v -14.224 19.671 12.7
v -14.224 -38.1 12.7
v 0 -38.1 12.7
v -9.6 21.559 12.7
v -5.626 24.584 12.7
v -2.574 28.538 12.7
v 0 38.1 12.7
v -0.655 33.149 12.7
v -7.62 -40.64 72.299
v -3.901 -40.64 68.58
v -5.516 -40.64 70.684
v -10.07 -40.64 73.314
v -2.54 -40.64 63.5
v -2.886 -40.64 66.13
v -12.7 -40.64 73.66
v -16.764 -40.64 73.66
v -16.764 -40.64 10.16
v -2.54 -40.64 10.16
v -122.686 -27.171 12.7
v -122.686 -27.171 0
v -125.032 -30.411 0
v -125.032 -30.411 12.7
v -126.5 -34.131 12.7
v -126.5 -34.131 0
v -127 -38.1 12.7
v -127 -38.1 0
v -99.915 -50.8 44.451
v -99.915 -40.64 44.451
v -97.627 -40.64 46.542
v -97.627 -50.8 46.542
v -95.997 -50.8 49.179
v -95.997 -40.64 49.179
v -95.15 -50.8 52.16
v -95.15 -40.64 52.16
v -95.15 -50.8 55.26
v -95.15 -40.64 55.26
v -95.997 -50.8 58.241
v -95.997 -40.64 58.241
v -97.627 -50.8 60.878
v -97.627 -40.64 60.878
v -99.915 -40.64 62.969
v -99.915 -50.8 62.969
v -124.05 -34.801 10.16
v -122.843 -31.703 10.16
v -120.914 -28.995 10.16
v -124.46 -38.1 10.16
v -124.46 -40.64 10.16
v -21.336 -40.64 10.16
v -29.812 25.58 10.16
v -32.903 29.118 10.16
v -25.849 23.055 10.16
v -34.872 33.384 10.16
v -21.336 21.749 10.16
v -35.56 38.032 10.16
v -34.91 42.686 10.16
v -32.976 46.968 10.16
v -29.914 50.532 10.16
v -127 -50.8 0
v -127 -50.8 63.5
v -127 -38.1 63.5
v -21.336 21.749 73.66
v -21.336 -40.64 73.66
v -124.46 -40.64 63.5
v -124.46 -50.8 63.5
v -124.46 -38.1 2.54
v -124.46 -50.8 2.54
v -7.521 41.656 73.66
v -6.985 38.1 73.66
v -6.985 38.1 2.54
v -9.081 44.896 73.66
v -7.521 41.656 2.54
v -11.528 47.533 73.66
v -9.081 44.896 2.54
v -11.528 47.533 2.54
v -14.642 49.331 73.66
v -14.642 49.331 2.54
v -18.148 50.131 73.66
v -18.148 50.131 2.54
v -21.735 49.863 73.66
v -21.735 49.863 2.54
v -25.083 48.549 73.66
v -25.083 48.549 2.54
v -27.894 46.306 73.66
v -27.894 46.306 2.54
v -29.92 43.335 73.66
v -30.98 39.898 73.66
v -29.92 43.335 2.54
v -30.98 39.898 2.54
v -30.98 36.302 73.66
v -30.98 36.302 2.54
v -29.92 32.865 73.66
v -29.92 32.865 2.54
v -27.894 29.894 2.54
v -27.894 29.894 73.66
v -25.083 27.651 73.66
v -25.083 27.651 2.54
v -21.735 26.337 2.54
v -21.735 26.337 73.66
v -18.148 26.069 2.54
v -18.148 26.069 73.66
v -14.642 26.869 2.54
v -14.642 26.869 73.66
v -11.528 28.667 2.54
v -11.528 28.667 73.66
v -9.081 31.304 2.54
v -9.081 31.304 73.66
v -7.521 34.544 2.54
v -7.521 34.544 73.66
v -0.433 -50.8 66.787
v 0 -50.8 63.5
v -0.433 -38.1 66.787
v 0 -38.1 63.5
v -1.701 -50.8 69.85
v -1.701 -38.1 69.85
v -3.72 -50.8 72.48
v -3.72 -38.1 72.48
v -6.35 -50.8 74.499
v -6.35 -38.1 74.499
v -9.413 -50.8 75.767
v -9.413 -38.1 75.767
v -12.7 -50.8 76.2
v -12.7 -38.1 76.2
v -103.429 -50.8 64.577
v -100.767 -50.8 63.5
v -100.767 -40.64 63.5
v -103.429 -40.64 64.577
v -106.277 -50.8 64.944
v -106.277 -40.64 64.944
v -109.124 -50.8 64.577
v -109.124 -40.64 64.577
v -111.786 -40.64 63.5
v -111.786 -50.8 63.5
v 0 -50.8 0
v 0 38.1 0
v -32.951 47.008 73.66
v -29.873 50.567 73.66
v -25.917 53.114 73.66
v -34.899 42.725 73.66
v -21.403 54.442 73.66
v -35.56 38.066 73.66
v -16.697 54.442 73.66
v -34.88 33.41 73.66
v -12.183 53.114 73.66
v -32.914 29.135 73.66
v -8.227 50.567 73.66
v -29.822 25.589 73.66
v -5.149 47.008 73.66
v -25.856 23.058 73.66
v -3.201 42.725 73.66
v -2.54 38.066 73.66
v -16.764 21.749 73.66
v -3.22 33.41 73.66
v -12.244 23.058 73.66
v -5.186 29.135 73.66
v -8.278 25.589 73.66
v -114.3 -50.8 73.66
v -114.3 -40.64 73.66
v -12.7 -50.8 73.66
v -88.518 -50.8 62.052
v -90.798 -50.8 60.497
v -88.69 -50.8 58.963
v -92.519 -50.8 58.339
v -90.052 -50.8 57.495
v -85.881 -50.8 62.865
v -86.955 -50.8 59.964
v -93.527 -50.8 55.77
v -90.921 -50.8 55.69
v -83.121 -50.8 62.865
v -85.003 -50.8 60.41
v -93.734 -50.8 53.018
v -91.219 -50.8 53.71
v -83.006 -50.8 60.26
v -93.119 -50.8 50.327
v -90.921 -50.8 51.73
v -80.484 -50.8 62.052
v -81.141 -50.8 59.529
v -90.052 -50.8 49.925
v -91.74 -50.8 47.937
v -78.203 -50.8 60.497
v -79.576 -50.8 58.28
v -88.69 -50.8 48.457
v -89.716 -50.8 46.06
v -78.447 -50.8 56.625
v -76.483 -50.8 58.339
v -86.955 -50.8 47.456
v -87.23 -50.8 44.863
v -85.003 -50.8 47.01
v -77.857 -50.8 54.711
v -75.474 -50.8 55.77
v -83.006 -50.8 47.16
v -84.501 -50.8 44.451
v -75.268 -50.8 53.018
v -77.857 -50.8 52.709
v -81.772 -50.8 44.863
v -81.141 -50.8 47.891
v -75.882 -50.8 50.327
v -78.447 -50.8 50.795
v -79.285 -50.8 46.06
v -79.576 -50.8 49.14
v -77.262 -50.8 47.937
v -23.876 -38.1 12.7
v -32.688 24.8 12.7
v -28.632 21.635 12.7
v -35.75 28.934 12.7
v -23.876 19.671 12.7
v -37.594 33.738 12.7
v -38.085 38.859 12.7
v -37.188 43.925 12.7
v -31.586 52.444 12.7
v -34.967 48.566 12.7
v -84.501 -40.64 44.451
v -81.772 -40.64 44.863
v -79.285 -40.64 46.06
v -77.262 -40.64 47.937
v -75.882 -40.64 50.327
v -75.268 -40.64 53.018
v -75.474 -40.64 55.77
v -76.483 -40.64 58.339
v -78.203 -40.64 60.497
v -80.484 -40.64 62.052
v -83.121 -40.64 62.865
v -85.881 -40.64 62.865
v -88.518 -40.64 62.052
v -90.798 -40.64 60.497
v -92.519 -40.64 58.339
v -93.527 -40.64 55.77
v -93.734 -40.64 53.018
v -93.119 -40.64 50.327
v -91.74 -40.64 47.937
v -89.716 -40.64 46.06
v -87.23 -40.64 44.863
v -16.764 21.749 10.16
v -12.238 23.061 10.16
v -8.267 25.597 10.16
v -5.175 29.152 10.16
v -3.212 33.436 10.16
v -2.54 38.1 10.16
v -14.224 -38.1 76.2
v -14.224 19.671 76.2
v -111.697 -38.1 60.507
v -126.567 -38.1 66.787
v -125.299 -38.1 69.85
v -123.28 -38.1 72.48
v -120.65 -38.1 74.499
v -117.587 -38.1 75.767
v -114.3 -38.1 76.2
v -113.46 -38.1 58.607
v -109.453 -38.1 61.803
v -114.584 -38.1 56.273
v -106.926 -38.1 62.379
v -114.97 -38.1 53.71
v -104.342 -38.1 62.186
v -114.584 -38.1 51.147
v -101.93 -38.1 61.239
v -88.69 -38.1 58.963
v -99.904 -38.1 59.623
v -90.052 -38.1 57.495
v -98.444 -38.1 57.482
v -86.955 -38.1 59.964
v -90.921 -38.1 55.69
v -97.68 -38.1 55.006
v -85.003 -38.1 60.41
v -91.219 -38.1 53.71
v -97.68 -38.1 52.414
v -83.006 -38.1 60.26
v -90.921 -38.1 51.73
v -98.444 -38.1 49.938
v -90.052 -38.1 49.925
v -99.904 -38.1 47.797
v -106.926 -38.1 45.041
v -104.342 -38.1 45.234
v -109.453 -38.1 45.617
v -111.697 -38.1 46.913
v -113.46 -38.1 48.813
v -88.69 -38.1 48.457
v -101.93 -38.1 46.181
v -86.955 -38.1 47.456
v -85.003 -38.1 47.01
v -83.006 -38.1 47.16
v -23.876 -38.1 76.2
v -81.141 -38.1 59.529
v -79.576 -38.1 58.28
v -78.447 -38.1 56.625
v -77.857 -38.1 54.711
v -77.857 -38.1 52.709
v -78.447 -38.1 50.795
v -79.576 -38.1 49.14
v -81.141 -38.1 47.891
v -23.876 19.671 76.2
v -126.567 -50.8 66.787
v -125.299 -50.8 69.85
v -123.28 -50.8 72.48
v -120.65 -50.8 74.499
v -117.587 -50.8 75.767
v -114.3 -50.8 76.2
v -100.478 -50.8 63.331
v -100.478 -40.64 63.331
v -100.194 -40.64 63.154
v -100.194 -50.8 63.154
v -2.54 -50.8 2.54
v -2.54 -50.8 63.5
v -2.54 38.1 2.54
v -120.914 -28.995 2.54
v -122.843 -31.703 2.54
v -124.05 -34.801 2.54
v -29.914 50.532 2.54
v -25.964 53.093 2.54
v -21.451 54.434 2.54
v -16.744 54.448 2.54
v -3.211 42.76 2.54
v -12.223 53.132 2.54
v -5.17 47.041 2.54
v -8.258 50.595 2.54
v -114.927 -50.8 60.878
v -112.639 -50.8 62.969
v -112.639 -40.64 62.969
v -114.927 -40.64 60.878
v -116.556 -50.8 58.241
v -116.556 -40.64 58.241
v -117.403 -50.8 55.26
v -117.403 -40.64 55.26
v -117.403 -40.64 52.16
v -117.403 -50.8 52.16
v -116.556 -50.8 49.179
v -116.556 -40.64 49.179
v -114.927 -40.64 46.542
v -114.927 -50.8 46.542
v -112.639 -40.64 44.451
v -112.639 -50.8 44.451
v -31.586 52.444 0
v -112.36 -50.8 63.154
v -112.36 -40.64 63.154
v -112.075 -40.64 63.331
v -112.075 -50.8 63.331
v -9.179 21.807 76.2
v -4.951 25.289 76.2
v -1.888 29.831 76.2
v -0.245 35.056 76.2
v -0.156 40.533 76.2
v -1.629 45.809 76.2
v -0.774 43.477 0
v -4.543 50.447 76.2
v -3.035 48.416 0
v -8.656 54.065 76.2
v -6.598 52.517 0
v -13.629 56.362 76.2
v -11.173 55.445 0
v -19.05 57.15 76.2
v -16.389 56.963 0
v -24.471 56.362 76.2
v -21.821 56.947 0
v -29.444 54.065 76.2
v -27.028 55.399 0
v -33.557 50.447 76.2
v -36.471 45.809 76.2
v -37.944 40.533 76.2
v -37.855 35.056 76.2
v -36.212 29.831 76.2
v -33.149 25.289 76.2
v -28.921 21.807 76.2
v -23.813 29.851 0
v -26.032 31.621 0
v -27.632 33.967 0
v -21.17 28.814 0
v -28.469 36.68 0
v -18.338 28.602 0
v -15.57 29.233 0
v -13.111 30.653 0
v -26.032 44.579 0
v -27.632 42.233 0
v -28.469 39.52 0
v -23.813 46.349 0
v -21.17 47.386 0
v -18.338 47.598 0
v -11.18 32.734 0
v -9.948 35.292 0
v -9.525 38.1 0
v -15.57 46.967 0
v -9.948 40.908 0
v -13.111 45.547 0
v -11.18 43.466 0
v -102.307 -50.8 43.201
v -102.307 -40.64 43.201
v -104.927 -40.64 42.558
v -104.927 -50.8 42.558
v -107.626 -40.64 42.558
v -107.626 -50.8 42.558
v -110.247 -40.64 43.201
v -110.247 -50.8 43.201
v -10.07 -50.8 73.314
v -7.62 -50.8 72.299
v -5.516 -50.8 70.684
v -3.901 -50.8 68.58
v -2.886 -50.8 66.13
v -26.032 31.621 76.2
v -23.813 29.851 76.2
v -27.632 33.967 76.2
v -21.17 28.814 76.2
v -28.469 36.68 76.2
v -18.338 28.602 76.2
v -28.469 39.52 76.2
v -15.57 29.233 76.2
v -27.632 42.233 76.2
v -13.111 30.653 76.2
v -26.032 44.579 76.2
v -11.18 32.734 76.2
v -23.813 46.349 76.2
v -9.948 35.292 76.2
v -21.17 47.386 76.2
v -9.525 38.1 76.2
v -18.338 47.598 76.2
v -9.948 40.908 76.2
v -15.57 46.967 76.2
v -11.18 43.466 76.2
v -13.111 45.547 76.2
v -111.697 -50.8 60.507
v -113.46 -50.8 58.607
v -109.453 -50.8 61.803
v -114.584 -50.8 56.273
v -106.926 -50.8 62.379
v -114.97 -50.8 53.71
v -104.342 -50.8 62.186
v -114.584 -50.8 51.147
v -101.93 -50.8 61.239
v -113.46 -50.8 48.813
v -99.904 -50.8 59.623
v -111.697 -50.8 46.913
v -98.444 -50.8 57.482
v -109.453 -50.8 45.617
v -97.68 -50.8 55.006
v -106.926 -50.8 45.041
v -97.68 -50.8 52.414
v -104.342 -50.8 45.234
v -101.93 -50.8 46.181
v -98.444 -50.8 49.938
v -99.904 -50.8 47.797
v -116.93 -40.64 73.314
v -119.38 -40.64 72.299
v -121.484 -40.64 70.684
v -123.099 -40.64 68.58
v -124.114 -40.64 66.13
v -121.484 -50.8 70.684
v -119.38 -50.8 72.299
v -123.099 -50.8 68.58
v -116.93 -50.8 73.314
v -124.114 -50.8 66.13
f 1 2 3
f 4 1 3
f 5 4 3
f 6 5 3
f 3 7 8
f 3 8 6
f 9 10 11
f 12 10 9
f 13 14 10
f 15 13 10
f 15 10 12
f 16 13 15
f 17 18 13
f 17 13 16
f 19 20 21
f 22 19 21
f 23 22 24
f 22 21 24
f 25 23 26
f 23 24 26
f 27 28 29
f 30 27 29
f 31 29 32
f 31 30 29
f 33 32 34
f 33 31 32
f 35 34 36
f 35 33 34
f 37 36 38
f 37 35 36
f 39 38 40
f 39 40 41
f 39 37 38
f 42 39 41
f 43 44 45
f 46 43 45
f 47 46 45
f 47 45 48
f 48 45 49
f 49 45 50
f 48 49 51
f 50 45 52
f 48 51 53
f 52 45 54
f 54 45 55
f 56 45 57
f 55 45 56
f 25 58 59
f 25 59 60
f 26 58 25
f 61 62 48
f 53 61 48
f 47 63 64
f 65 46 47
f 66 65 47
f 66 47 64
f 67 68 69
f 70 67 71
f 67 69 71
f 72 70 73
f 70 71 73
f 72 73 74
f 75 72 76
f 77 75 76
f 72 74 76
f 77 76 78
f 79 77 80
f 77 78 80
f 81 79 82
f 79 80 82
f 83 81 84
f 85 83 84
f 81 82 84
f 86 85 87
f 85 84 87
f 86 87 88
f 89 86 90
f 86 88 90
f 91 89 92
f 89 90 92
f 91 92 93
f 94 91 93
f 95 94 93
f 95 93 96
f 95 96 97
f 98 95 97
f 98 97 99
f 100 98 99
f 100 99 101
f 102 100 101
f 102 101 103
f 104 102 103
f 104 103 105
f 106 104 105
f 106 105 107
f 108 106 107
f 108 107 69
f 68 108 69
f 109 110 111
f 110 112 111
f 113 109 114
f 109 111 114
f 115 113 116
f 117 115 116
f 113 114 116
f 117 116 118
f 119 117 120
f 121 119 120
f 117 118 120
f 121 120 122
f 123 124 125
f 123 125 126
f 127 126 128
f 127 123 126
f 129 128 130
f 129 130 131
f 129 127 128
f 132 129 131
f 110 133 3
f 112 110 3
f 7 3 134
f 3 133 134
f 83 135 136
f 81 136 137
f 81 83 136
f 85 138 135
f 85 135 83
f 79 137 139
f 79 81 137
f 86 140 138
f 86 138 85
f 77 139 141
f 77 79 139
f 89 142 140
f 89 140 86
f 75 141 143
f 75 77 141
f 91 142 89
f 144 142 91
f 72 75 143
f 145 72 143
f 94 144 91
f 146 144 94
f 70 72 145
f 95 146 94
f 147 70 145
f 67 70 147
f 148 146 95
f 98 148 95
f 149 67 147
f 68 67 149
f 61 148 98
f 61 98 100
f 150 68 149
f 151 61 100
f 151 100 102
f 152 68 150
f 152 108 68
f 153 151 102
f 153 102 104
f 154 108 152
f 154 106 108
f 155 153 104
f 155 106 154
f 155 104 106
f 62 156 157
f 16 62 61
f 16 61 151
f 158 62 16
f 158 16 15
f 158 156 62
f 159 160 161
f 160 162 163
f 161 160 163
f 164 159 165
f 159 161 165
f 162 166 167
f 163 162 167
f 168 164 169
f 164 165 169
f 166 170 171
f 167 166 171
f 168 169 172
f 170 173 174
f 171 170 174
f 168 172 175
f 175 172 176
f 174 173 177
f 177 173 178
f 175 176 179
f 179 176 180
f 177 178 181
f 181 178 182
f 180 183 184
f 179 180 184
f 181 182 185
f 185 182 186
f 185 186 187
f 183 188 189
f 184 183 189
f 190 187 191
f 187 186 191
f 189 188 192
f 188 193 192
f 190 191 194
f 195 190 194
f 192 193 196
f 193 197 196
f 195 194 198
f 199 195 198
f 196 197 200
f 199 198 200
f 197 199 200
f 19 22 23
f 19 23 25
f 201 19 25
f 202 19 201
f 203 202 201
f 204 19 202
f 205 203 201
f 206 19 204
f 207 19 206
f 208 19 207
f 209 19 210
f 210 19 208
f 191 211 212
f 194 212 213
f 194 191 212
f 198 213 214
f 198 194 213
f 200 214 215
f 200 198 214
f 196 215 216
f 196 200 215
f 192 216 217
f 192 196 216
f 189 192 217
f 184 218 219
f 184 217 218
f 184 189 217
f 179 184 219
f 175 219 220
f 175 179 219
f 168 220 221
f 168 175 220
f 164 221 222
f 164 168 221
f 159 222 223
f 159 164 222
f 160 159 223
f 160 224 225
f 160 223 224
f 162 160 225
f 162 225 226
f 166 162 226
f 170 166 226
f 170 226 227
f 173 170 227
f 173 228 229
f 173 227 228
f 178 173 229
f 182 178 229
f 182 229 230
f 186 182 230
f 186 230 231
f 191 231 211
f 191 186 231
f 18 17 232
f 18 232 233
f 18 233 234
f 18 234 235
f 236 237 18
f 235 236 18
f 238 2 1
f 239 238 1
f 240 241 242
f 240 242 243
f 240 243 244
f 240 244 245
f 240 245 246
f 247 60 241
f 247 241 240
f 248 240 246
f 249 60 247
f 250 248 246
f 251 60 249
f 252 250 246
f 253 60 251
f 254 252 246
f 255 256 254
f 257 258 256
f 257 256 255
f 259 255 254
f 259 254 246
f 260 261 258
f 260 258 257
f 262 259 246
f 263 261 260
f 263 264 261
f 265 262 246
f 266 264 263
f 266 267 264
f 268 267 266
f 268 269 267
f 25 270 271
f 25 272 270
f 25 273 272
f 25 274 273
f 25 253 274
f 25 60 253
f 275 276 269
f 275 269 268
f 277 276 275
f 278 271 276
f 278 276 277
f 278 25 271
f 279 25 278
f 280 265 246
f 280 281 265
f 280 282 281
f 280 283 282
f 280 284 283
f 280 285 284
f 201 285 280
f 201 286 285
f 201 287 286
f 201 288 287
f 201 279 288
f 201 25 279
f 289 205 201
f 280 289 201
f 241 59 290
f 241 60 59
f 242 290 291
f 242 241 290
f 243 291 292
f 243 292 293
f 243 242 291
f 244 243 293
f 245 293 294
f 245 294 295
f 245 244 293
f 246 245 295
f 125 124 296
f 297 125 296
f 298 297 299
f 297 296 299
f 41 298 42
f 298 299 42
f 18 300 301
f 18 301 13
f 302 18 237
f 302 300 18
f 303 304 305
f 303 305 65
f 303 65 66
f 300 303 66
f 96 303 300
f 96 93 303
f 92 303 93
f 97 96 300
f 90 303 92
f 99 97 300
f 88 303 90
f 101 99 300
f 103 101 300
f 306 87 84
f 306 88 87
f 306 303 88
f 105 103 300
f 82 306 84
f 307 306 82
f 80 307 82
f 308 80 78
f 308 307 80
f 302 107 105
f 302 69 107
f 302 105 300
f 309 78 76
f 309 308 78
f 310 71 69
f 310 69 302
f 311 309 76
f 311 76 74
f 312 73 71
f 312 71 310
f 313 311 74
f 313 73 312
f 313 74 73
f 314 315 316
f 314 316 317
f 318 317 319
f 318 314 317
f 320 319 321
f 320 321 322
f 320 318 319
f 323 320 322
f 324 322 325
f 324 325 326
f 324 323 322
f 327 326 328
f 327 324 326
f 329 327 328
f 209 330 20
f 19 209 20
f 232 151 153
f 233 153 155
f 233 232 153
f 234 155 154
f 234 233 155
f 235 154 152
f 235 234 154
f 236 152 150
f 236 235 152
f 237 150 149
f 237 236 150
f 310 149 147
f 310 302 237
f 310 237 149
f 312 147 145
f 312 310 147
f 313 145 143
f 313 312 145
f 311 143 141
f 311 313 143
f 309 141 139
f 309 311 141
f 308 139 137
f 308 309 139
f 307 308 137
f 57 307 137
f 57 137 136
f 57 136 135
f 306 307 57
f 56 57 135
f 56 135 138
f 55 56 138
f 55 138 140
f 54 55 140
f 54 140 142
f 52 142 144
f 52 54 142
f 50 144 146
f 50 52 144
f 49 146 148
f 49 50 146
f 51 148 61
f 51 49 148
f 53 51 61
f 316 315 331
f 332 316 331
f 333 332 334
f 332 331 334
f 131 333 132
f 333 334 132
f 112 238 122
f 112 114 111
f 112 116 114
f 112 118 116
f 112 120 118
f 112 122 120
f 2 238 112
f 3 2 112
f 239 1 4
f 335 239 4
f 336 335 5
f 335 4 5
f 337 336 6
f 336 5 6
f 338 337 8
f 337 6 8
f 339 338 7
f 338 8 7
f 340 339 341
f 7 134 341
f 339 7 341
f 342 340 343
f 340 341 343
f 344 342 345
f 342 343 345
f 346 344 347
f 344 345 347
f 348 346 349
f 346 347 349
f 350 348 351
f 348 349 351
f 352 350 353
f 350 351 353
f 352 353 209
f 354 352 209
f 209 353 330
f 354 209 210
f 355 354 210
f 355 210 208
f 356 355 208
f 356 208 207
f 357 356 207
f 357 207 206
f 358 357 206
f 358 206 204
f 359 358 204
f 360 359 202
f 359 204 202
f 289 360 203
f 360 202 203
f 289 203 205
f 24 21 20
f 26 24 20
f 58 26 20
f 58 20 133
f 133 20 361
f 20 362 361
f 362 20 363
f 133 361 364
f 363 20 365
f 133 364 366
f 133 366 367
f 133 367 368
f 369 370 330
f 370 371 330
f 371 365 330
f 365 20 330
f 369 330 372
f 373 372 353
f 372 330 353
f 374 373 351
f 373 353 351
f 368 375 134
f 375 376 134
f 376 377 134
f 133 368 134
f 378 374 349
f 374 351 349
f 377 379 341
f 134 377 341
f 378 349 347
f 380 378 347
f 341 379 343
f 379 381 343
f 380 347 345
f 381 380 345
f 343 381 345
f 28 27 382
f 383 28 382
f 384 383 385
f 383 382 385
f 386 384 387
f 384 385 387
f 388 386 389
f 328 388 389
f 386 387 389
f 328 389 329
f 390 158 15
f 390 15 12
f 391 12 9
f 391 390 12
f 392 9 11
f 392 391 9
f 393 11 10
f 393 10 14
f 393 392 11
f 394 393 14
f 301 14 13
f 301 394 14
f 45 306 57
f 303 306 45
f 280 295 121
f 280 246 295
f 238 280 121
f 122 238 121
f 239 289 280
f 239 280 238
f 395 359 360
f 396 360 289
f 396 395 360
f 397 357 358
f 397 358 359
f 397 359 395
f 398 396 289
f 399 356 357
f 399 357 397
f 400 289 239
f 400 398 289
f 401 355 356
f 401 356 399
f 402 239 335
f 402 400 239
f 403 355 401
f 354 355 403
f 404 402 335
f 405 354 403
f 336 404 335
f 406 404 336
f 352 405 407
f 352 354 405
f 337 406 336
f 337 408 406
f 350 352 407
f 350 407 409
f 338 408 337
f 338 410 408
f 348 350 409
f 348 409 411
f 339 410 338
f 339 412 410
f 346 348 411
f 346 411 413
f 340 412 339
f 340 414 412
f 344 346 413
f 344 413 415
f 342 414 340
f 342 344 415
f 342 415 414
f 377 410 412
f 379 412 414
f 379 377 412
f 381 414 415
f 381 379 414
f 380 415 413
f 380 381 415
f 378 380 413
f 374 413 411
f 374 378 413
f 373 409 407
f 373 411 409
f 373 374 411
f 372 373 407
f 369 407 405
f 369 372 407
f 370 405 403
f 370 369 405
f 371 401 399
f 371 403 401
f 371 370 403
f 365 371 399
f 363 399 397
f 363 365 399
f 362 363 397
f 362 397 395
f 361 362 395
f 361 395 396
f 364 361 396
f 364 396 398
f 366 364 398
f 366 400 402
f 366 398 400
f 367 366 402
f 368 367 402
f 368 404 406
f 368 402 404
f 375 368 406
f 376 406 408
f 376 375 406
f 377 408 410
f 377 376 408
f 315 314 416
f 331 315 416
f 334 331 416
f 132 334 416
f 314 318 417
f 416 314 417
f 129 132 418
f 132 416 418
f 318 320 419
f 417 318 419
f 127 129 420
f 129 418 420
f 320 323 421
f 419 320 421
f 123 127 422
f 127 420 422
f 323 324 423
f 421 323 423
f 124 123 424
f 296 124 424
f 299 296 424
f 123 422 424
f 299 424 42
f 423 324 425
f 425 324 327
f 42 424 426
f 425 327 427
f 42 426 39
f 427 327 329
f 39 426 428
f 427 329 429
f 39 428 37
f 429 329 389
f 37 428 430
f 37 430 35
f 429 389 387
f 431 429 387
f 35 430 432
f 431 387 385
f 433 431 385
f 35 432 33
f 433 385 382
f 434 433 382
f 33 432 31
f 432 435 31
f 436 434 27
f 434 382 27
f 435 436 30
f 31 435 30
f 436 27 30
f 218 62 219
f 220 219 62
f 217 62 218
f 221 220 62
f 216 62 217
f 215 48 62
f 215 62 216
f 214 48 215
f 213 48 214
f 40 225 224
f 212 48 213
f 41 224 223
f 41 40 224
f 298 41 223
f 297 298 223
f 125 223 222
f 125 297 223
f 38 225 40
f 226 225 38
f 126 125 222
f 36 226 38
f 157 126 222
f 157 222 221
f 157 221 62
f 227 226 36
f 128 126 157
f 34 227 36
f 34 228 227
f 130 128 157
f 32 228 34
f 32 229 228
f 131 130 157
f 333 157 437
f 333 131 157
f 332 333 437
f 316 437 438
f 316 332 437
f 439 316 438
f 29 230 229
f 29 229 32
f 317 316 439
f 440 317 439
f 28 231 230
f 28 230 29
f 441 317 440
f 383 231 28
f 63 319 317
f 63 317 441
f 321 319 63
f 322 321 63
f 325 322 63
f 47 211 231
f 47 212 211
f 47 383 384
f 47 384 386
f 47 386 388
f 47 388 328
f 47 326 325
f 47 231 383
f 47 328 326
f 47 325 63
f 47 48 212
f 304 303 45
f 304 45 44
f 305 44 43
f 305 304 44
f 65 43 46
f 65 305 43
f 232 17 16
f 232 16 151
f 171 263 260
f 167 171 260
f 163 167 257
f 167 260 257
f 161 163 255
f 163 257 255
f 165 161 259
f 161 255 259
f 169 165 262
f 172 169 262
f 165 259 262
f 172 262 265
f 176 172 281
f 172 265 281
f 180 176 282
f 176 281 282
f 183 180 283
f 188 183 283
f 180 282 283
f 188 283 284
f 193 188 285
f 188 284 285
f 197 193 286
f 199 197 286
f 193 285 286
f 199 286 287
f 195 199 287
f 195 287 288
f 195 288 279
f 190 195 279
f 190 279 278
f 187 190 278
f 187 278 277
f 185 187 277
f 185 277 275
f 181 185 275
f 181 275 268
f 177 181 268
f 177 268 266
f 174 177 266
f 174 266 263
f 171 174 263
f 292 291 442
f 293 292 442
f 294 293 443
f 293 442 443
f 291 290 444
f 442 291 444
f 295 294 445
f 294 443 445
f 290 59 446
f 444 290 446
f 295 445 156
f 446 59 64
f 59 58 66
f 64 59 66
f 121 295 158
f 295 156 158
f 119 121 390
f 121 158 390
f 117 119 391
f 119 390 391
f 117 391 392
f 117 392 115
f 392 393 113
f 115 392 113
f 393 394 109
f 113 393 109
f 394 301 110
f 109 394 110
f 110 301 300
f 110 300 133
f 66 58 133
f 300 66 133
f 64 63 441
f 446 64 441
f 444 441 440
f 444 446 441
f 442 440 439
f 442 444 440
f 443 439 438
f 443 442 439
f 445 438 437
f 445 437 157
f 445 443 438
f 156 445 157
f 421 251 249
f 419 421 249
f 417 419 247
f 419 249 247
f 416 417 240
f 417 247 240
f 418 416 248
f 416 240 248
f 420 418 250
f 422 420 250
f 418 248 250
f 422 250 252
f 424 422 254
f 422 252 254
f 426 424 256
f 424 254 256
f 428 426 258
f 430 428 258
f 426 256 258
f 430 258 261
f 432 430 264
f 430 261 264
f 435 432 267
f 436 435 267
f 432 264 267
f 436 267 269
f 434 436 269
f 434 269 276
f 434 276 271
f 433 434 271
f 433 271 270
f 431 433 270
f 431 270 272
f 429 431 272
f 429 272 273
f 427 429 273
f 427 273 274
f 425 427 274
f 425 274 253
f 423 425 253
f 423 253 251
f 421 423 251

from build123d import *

# Parameters (mm, degrees)
SKETCH1_W            = 127
SKETCH1_H            = 12.7
BOSS_EXTRUDE1_DEPTH  = 76.2
FILLET2_R            = 12.7
BOSS_EXTRUDE3_DEPTH  = 76.2
BOSS_EXTRUDE4_DEPTH  = 12.7
SKETCH3_R            = 8.693712638
SKETCH3_R_2          = 6.718686286
CUT_EXTRUDE2_DEPTH   = 177.090892723
SKETCH1_8_R          = 9.525
CUT_EXTRUDE3_DEPTH   = 159.75
SHELL4_START         = 2.54
SHELL4_OUTLINE_R     = 12.065
SHELL4_DEPTH         = 41.911304946
SHELL4_2_DEPTH       = 7.62
SHELL4_START_2       = 62.968677719
SHELL4_3_OUTLINE_R   = 12.065
SHELL4_3_DEPTH       = 0.531322281
SHELL4_START_3       = -50.8
SHELL4_4_DEPTH       = 10.16
SHELL4_START_4       = -40.64
SHELL4_5_OUTLINE_W   = 4.572
SHELL4_5_OUTLINE_H   = 18.517372773
SHELL4_5_OUTLINE_H_2 = 10.16
SHELL4_5_DEPTH       = 66.6749999
SHELL4_6_DEPTH       = 10.16
SHELL4_START_5       = 44.451304946
SHELL4_7_OUTLINE_R   = 12.065
SHELL4_7_DEPTH       = 29.208695054


with BuildPart() as part:
    # Sketch1 → Boss-Extrude1 (new body)
    with BuildSketch(Plane.XY):
        with Locations((-63.5, -44.45)):
            Rectangle(SKETCH1_W, SKETCH1_H)
    extrude(amount=BOSS_EXTRUDE1_DEPTH)

    # Fillet2
    fillet2_edges = [part.edges().sort_by_distance(p)[0] for p in [
        (-127, -44.45, 76.2),
        (0, -44.45, 76.2),
    ]]
    fillet(fillet2_edges, radius=FILLET2_R)

    # Sketch1<6> → Boss-Extrude3 (add)
    with BuildSketch(Plane.XY):
        with BuildLine():
            ThreePointArc((-14.224, 19.671429138), (-19.05, 57.15), (-23.876, 19.671429138))
            Line((-23.876, 19.671429138), (-23.876, -38.1))
            Line((-23.876, -38.1), (-14.224, -38.1))
            Line((-14.224, -38.1), (-14.224, 19.671429138))
        make_face()
    extrude(amount=BOSS_EXTRUDE3_DEPTH)

    # Sketch1<7> → Boss-Extrude4 (add)
    with BuildSketch(Plane.XY):
        with BuildLine():
            ThreePointArc((-23.876, 19.671429138), (-37.59378257, 33.737589198), (-31.585775702, 52.444226279))
            Line((-31.585775702, 52.444226279), (-122.686278821, -27.170766624))
            ThreePointArc((-122.686278821, -27.170766624), (-125.882553095, -32.225131223), (-127, -38.1))
            Line((-127, -38.1), (-23.876, -38.1))
            Line((-23.876, -38.1), (-23.876, 19.671429138))
        make_face()
        with BuildLine():
            Line((0, -38.1), (0, 38.1))
            ThreePointArc((0, 38.1), (-3.969585549, 26.460257735), (-14.224, 19.671429138))
            Line((-14.224, 19.671429138), (-14.224, -38.1))
            Line((-14.224, -38.1), (0, -38.1))
        make_face()
    extrude(amount=BOSS_EXTRUDE4_DEPTH)

    # Sketch3 → Cut-Extrude2 (cut, through all)
    with BuildSketch(Plane(origin=(0, -38.1, 0), x_dir=(1, 0, 0), z_dir=(0, 1, 0))):
        with Locations(Location((-106.276718745, -53.709991333, 0), (0, 0, 180))):
            Circle(SKETCH3_R)
        with Locations(Location((-84.500771906, -53.709991333, 0), (0, 0, 180))):
            Circle(SKETCH3_R_2)
    extrude(amount=-CUT_EXTRUDE2_DEPTH, mode=Mode.SUBTRACT)

    # Sketch1<8> → Cut-Extrude3 (cut, through all)
    with BuildSketch(Plane.XY):
        with Locations((-19.05, 38.1)):
            Circle(SKETCH1_8_R)
    extrude(amount=CUT_EXTRUDE3_DEPTH, mode=Mode.SUBTRACT)

    # Shell4: read off the stored shape, not the designer's step
    # Shell4 outline → Shell4 (cut)
    with BuildSketch(Plane.XY.offset(SHELL4_START)):
        with BuildLine():
            ThreePointArc((-16.764, 21.74902743), (-19.05, 54.61), (-21.336, 21.74902743))
            Line((-21.336, 21.74902743), (-21.336, -40.64))
            Line((-21.336, -40.64), (-124.46, -40.64))
            Line((-124.46, -40.64), (-124.46, -50.8))
            Line((-124.46, -50.8), (-2.54, -50.8))
            Line((-2.54, -50.8), (-2.54, -40.64))
            Line((-2.54, -40.64), (-16.764, -40.64))
            Line((-16.764, -40.64), (-16.764, 21.74902743))
        make_face()
        with Locations((-19.05, 38.1)):
            Circle(SHELL4_OUTLINE_R, mode=Mode.SUBTRACT)
    extrude(amount=SHELL4_DEPTH, mode=Mode.SUBTRACT)

    # Shell4 2 outline → Shell4 2 (cut)
    with BuildSketch(Plane.XY.offset(SHELL4_START)):
        with BuildLine():
            Line((-21.336, -40.64), (-21.336, 21.74902743))
            ThreePointArc((-21.336, 21.74902743), (-34.872227338, 33.384364087), (-29.914338942, 50.531662775))
            Line((-29.914338942, 50.531662775), (-120.914264565, -28.995432955))
            ThreePointArc((-120.914264565, -28.995432955), (-123.542285503, -33.214680644), (-124.46, -38.1))
            Line((-124.46, -38.1), (-124.46, -40.64))
            Line((-124.46, -40.64), (-21.336, -40.64))
        make_face()
        with BuildLine():
            Line((-2.54, -40.64), (-2.54, 38.1))
            ThreePointArc((-2.54, 38.1), (-6.593636968, 27.263989664), (-16.764, 21.74902743))
            Line((-16.764, 21.74902743), (-16.764, -40.64))
            Line((-16.764, -40.64), (-2.54, -40.64))
        make_face()
    extrude(amount=SHELL4_2_DEPTH, mode=Mode.SUBTRACT)

    # Shell4 3 outline → Shell4 3 (cut)
    with BuildSketch(Plane.XY.offset(SHELL4_START_2)):
        with BuildLine():
            ThreePointArc((-16.764, 21.74902743), (-19.05, 54.61), (-21.336, 21.74902743))
            Line((-21.336, 21.74902743), (-21.336, -40.64))
            Line((-21.336, -40.64), (-124.46, -40.64))
            Line((-124.46, -40.64), (-124.46, -50.8))
            Line((-124.46, -50.8), (-2.54, -50.8))
            Line((-2.54, -50.8), (-2.54, -40.64))
            Line((-2.54, -40.64), (-16.764, -40.64))
            Line((-16.764, -40.64), (-16.764, 21.74902743))
        make_face()
        with Locations((-19.05, 38.1)):
            Circle(SHELL4_3_OUTLINE_R, mode=Mode.SUBTRACT)
    extrude(amount=SHELL4_3_DEPTH, mode=Mode.SUBTRACT)

    # Shell4 4 outline → Shell4 4 (cut)
    with BuildSketch(Plane(origin=(0, 0, 0), x_dir=(1, 0, 0), z_dir=(0, 1, 0)).offset(SHELL4_START_3)):
        with BuildLine():
            Line((-2.54, -62.968677719), (-2.54, -44.451304946))
            Line((-2.54, -44.451304946), (-84.500771906, -44.451305047))
            ThreePointArc((-84.500771906, -44.451305047), (-75.24208562, -53.709991333), (-84.500771906, -62.968677619))
            Line((-84.500771906, -62.968677619), (-2.54, -62.968677719))
        make_face()
        with BuildLine():
            ThreePointArc((-12.7, -73.66), (-5.515795103, -70.684204897), (-2.54, -63.5))
            Line((-2.54, -63.5), (-100.767451105, -63.5))
            ThreePointArc((-100.767451105, -63.5), (-106.276718745, -64.943703971), (-111.785986385, -63.5))
            Line((-111.785986385, -63.5), (-124.46, -63.5))
            ThreePointArc((-124.46, -63.5), (-121.484204897, -70.684204897), (-114.3, -73.66))
            Line((-114.3, -73.66), (-12.7, -73.66))
        make_face()
        with BuildLine():
            ThreePointArc((-84.500771906, -62.968677619), (-93.759458192, -53.709991333), (-84.500771906, -44.451305047))
            Line((-84.500771906, -44.451305047), (-99.914877343, -44.451304946))
            ThreePointArc((-99.914877343, -44.451304946), (-95.043006107, -53.709991332), (-99.914877342, -62.968677719))
            Line((-99.914877342, -62.968677719), (-84.500771906, -62.968677619))
        make_face()
        with BuildLine():
            ThreePointArc((-112.638560148, -62.968677719), (-117.510431383, -53.709991332), (-112.638560147, -44.451304946))
            Line((-112.638560147, -44.451304946), (-124.46, -44.451304946))
            Line((-124.46, -44.451304946), (-124.46, -62.968677719))
            Line((-124.46, -62.968677719), (-112.638560148, -62.968677719))
        make_face()
    extrude(amount=SHELL4_4_DEPTH, mode=Mode.SUBTRACT)

    # Shell4 5 outline → Shell4 5 (cut)
    with BuildSketch(Plane(origin=(0, 0, 0), x_dir=(1, 0, 0), z_dir=(0, 1, 0)).offset(SHELL4_START_4)):
        with Locations((-19.05, -53.709991333)):
            Rectangle(SHELL4_5_OUTLINE_W, SHELL4_5_OUTLINE_H)
        with Locations((-19.05, -68.58)):
            Rectangle(SHELL4_5_OUTLINE_W, SHELL4_5_OUTLINE_H_2)
    extrude(amount=SHELL4_5_DEPTH, mode=Mode.SUBTRACT)

    # Shell4 6 outline → Shell4 6 (add)
    with BuildSketch(Plane(origin=(0, 0, 0), x_dir=(1, 0, 0), z_dir=(0, 1, 0)).offset(SHELL4_START_3)):
        with BuildLine():
            Line((-112.638560147, -44.451304946), (-99.914877343, -44.451304946))
            ThreePointArc((-99.914877343, -44.451304946), (-106.276718745, -42.476278695), (-112.638560147, -44.451304946))
        make_face()
        with BuildLine():
            Line((-111.785986385, -63.5), (-100.767451105, -63.5))
            ThreePointArc((-100.767451105, -63.5), (-100.335222021, -63.243873874), (-99.914877342, -62.968677719))
            Line((-99.914877342, -62.968677719), (-112.638560148, -62.968677719))
            ThreePointArc((-112.638560148, -62.968677719), (-112.218215469, -63.243873874), (-111.785986385, -63.5))
        make_face()
    extrude(amount=SHELL4_6_DEPTH)

    # Shell4 7 outline → Shell4 7 (cut)
    with BuildSketch(Plane.XY.offset(SHELL4_START_5)):
        with BuildLine():
            ThreePointArc((-16.764, 21.74902743), (-19.05, 54.61), (-21.336, 21.74902743))
            Line((-21.336, 21.74902743), (-19.05, 21.429425891))
            Line((-19.05, 21.429425891), (-16.764, 21.74902743))
        make_face()
        with Locations((-19.05, 38.1)):
            Circle(SHELL4_7_OUTLINE_R, mode=Mode.SUBTRACT)
    extrude(amount=SHELL4_7_DEPTH, mode=Mode.SUBTRACT)


solid = part.part
